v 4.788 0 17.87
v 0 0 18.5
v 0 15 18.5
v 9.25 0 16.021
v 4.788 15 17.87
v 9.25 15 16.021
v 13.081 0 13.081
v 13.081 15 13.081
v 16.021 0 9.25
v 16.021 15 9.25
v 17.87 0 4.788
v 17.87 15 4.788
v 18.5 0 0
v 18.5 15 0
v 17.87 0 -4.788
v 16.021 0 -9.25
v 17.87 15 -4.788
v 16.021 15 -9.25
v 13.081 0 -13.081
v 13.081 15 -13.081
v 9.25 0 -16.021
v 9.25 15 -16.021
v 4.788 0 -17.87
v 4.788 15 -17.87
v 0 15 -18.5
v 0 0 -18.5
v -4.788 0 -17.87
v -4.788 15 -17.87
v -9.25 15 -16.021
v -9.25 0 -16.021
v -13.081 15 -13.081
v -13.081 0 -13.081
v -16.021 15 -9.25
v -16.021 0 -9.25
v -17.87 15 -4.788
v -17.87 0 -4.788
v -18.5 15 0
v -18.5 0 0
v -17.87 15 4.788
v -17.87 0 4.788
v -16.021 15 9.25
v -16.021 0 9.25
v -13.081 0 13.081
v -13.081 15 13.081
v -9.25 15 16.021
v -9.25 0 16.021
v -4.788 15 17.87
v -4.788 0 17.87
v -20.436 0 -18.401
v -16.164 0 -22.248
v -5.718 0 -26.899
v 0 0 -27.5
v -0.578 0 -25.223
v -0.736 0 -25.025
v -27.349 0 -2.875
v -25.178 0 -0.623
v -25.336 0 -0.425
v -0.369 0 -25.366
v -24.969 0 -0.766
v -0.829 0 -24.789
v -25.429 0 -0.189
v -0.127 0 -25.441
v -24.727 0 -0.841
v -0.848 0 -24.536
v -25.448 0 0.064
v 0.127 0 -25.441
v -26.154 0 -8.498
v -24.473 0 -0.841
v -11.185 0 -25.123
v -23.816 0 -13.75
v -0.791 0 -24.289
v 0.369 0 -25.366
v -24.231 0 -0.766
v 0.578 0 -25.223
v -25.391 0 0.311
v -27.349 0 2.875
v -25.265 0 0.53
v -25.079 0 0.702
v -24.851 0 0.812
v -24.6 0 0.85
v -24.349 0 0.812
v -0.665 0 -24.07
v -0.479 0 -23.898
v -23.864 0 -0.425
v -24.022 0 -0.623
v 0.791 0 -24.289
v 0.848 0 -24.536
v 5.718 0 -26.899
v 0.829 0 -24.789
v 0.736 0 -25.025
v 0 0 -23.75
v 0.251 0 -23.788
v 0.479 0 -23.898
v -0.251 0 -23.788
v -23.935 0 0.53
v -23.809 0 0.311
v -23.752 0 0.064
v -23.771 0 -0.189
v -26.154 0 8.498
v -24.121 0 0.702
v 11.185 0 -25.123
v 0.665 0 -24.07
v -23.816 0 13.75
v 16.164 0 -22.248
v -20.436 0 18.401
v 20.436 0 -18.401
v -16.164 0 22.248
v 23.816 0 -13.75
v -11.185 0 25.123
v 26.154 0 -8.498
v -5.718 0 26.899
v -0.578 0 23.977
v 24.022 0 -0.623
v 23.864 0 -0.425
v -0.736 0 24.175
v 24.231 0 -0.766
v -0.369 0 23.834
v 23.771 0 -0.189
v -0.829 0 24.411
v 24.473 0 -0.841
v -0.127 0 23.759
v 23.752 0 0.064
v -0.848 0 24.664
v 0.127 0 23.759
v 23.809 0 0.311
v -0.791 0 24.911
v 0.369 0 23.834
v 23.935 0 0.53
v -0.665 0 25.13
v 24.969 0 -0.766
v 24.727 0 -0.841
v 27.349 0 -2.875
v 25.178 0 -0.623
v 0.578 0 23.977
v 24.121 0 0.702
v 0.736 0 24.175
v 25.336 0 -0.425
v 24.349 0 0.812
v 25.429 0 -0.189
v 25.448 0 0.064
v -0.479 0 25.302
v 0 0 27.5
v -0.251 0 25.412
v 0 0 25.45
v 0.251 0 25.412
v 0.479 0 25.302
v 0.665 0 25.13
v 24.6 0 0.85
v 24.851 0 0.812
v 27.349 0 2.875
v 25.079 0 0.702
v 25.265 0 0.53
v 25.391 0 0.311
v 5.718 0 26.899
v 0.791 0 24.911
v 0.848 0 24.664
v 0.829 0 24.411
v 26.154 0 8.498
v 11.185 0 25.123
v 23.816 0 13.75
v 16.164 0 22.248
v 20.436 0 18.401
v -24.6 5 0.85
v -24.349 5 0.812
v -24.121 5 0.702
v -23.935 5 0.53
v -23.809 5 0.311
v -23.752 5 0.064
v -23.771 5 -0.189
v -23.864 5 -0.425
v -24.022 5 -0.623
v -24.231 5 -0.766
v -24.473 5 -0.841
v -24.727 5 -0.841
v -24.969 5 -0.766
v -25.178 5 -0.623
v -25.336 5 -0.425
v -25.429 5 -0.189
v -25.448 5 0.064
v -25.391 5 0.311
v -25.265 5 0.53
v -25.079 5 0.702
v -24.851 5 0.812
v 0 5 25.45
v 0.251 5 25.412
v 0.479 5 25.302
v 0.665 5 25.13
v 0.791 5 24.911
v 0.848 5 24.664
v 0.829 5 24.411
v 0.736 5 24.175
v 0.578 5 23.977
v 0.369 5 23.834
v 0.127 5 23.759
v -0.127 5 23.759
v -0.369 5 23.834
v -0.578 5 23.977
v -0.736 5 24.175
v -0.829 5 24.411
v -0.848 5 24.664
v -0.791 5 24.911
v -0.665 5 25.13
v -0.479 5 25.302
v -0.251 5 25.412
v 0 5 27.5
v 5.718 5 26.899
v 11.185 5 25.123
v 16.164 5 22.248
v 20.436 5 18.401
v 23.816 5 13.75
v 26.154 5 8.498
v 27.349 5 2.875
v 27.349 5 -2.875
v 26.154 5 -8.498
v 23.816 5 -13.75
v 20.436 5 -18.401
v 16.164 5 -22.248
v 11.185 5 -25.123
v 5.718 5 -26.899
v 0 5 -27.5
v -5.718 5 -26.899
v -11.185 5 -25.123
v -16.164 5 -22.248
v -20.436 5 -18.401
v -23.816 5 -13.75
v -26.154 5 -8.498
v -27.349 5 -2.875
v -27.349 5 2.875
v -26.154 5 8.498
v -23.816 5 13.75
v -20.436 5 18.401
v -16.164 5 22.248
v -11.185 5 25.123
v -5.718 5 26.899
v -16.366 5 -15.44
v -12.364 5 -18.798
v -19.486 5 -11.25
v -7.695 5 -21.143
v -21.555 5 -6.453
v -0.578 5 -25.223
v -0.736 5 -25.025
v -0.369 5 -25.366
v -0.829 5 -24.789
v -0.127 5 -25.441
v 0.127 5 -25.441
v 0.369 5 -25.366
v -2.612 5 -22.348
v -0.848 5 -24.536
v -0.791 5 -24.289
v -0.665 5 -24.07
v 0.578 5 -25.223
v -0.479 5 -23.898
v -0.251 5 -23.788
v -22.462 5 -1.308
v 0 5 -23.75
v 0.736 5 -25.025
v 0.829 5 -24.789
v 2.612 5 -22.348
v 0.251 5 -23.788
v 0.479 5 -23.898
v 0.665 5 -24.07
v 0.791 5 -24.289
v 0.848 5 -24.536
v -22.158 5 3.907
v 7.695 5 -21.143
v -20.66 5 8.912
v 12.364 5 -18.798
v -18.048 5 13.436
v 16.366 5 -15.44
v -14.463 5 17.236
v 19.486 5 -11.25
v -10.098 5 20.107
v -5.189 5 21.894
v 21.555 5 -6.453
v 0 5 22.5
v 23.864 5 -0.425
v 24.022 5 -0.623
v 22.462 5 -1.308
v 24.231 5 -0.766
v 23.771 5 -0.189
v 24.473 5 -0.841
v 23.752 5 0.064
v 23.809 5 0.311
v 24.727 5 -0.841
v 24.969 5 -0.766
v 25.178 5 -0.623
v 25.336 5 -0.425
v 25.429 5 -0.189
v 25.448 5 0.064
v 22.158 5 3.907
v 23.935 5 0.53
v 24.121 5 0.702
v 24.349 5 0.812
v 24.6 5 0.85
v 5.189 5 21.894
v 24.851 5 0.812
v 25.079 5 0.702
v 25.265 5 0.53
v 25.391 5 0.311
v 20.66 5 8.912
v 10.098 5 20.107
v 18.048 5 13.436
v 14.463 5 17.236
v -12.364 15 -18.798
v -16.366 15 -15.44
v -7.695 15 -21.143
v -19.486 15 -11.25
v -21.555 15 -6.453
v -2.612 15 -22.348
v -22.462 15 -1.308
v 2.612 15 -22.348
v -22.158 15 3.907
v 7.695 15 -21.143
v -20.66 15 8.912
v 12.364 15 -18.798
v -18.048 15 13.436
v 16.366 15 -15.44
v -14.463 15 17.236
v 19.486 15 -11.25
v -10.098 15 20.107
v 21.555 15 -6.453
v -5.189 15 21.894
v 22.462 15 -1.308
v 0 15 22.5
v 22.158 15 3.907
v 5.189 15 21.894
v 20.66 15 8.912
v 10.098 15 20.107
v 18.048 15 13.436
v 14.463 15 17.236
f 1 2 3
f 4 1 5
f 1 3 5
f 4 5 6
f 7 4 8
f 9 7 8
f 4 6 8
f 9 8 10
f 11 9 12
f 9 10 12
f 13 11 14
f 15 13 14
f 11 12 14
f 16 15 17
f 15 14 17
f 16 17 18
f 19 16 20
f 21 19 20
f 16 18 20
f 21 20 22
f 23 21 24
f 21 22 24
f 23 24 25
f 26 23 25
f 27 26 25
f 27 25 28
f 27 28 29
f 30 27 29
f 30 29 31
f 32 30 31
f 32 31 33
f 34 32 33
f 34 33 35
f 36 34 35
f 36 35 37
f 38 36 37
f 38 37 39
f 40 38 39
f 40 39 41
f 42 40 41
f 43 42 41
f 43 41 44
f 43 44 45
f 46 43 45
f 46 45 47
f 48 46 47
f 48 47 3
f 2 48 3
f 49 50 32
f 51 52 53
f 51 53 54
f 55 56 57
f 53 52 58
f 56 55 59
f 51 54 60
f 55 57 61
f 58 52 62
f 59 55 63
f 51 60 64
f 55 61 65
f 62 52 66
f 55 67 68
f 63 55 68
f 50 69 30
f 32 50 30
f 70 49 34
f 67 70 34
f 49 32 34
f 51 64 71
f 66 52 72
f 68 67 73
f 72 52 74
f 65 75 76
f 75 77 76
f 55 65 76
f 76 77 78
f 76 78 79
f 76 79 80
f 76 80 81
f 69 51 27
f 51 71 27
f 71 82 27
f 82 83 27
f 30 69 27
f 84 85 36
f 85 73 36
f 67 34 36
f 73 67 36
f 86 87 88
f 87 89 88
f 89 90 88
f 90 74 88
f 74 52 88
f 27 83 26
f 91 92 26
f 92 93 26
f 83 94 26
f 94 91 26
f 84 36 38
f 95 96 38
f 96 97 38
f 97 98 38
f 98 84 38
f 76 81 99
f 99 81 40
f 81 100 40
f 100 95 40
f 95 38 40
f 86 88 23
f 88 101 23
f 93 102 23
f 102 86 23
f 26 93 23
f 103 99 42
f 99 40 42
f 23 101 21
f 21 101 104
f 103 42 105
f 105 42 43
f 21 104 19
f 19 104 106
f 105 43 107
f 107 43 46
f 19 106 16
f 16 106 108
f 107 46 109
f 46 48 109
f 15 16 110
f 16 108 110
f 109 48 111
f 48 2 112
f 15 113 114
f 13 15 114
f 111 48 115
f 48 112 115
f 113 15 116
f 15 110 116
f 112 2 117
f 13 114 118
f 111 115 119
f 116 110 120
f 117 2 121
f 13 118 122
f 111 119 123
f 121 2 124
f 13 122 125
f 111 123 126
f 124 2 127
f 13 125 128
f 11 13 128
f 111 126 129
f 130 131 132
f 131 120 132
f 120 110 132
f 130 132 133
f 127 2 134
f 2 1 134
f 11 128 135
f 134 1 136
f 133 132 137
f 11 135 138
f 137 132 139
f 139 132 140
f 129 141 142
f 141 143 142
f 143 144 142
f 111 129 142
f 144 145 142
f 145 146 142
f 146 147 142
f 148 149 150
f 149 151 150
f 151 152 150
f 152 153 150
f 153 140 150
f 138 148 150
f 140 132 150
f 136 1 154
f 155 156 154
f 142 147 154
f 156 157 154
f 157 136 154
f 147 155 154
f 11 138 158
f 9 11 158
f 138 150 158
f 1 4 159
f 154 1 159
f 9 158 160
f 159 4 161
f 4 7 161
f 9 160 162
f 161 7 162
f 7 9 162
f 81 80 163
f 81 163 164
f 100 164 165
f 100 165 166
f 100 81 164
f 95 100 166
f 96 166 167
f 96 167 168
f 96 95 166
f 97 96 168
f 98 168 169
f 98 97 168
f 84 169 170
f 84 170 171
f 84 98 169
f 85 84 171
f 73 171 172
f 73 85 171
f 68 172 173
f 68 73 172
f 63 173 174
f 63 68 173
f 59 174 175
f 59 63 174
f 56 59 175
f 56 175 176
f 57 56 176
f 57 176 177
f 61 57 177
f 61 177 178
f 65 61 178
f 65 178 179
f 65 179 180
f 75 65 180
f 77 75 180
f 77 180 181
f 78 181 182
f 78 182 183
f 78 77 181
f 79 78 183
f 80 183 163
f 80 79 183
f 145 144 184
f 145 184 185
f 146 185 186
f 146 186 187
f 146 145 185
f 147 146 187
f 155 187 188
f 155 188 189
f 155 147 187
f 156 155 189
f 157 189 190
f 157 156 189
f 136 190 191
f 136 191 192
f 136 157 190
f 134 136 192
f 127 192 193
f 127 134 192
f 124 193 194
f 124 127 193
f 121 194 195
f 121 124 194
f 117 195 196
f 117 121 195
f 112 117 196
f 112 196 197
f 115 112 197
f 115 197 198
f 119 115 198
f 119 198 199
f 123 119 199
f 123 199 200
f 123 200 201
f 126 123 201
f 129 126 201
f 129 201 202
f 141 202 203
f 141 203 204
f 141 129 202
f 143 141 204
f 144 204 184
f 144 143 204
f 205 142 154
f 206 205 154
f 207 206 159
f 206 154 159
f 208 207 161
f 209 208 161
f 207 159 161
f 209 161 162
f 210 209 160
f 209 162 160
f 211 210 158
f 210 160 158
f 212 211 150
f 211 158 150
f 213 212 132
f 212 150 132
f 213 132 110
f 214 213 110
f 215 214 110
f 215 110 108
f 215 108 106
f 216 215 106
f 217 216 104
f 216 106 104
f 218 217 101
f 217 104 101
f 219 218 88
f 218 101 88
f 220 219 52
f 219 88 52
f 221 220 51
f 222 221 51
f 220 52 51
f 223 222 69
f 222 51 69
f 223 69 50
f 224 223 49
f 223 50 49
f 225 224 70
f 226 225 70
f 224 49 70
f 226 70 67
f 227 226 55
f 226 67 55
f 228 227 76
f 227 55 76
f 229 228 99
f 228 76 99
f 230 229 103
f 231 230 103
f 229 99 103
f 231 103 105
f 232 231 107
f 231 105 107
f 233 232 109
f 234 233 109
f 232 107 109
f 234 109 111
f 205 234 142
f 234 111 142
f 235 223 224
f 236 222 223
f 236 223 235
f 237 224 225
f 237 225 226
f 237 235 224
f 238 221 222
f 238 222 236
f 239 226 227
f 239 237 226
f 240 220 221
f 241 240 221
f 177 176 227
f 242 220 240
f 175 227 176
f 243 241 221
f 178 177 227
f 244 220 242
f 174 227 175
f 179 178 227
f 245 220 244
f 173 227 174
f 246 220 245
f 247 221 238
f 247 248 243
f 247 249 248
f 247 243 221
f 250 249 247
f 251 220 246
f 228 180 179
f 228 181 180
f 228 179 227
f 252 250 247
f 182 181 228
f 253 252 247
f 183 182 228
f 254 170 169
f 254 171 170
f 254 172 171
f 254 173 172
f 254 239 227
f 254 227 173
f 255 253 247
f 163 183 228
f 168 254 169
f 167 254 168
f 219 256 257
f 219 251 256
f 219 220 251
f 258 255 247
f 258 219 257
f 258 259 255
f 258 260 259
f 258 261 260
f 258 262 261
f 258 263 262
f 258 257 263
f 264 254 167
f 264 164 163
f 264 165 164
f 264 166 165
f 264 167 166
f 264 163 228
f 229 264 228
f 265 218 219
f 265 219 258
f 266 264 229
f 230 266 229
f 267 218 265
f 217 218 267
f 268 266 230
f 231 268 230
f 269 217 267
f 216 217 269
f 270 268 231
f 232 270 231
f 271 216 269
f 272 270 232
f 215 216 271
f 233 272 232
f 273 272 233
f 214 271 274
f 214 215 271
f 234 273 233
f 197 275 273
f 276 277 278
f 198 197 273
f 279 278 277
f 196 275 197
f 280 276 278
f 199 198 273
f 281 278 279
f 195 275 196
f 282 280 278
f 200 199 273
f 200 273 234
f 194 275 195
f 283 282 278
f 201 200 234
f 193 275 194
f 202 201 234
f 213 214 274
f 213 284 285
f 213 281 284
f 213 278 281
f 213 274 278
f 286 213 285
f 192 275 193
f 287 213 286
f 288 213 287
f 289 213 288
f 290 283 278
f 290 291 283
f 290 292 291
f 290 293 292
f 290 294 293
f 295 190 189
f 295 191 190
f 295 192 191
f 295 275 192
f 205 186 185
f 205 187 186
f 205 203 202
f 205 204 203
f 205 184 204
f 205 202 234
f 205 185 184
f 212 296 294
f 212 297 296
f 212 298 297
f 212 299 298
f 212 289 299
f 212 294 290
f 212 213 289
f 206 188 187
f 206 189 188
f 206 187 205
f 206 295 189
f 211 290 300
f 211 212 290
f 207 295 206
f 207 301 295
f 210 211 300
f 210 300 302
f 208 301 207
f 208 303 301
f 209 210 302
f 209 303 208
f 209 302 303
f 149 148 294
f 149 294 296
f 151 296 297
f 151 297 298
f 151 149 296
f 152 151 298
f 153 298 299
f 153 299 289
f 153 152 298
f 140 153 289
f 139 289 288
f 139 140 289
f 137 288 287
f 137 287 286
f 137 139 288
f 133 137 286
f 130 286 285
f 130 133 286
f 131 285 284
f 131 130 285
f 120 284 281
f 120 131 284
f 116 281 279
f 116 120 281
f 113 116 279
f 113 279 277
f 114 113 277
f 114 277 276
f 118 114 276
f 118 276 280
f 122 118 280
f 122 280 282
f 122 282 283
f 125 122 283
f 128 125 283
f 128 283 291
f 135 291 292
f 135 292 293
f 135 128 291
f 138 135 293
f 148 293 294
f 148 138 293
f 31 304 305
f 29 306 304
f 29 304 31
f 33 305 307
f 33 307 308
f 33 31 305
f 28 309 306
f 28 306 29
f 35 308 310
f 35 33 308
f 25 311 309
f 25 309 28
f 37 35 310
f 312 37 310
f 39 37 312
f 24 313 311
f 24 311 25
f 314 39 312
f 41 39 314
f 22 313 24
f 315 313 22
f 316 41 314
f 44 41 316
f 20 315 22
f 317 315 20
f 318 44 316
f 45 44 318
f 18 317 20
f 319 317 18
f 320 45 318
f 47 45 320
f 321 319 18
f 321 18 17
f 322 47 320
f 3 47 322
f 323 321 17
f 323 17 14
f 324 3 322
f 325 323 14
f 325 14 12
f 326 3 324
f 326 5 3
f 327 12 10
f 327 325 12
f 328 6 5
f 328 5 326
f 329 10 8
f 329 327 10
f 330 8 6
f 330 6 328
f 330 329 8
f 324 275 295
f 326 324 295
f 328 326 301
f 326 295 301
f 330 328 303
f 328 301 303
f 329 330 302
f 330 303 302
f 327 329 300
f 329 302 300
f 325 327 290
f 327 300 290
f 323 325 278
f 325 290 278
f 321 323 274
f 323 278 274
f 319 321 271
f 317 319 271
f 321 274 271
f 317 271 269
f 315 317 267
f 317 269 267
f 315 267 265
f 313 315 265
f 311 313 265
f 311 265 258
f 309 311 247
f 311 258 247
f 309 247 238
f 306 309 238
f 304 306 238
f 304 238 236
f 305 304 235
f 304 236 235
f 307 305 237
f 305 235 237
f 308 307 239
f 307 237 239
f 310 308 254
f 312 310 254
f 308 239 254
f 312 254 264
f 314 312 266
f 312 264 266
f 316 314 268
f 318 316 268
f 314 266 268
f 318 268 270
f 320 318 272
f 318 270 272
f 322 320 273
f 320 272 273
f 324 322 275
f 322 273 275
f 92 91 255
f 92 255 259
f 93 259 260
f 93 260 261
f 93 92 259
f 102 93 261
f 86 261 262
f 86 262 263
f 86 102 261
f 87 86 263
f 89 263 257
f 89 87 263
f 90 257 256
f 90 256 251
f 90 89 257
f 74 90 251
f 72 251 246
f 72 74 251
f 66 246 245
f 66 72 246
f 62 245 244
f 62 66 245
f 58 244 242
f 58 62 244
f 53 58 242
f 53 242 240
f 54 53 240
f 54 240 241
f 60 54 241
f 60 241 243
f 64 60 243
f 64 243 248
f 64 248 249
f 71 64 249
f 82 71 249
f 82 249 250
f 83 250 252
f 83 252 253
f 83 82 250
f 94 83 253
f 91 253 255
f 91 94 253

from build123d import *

# Parameters (mm, degrees)
SKETCH_2_R          = 27.5
SKETCH_2_R_2        = 0.85
EXTRUDE_1_DEPTH     = 5
SKETCH_3_R          = 22.5
EXTRUDE_2_DEPTH     = 10
SKETCH_4_R          = 18.5
CUT_EXTRUDE_1_DEPTH = 42.683330001


with BuildPart() as part:
    # 草图2 → 凸台-拉伸1 (new body)
    with BuildSketch(Plane(origin=(0, 0, 0), x_dir=(1, 0, 0), z_dir=(0, 1, 0))):
        with Locations(Location((0, 0, 0), (0, 0, 270))):
            Circle(SKETCH_2_R)
        with Locations(Location((0, 24.6, 0), (0, 0, 270))):
            Circle(SKETCH_2_R_2, mode=Mode.SUBTRACT)
        with Locations(Location((24.6, 0, 0), (0, 0, 270))):
            Circle(SKETCH_2_R_2, mode=Mode.SUBTRACT)
        with Locations(Location((0, -24.6, 0), (0, 0, 270))):
            Circle(SKETCH_2_R_2, mode=Mode.SUBTRACT)
        with Locations(Location((-24.6, 0, 0), (0, 0, 270))):
            Circle(SKETCH_2_R_2, mode=Mode.SUBTRACT)
    extrude(amount=EXTRUDE_1_DEPTH)

    # 草图3 → 凸台-拉伸2 (add)
    with BuildSketch(Plane(origin=(0, 5, 0), x_dir=(1, 0, 0), z_dir=(0, 1, 0))):
        with Locations(Location((0, 0, 0), (0, 0, 270))):
            Circle(SKETCH_3_R)
    extrude(amount=EXTRUDE_2_DEPTH)

    # 草图4 → 切除-拉伸1 (cut, through all)
    with BuildSketch(Plane(origin=(0, 15, 0), x_dir=(1, 0, 0), z_dir=(0, 1, 0))):
        with Locations(Location((0, 0, 0), (0, 0, 270))):
            Circle(SKETCH_4_R)
    extrude(amount=-CUT_EXTRUDE_1_DEPTH, mode=Mode.SUBTRACT)


solid = part.part
